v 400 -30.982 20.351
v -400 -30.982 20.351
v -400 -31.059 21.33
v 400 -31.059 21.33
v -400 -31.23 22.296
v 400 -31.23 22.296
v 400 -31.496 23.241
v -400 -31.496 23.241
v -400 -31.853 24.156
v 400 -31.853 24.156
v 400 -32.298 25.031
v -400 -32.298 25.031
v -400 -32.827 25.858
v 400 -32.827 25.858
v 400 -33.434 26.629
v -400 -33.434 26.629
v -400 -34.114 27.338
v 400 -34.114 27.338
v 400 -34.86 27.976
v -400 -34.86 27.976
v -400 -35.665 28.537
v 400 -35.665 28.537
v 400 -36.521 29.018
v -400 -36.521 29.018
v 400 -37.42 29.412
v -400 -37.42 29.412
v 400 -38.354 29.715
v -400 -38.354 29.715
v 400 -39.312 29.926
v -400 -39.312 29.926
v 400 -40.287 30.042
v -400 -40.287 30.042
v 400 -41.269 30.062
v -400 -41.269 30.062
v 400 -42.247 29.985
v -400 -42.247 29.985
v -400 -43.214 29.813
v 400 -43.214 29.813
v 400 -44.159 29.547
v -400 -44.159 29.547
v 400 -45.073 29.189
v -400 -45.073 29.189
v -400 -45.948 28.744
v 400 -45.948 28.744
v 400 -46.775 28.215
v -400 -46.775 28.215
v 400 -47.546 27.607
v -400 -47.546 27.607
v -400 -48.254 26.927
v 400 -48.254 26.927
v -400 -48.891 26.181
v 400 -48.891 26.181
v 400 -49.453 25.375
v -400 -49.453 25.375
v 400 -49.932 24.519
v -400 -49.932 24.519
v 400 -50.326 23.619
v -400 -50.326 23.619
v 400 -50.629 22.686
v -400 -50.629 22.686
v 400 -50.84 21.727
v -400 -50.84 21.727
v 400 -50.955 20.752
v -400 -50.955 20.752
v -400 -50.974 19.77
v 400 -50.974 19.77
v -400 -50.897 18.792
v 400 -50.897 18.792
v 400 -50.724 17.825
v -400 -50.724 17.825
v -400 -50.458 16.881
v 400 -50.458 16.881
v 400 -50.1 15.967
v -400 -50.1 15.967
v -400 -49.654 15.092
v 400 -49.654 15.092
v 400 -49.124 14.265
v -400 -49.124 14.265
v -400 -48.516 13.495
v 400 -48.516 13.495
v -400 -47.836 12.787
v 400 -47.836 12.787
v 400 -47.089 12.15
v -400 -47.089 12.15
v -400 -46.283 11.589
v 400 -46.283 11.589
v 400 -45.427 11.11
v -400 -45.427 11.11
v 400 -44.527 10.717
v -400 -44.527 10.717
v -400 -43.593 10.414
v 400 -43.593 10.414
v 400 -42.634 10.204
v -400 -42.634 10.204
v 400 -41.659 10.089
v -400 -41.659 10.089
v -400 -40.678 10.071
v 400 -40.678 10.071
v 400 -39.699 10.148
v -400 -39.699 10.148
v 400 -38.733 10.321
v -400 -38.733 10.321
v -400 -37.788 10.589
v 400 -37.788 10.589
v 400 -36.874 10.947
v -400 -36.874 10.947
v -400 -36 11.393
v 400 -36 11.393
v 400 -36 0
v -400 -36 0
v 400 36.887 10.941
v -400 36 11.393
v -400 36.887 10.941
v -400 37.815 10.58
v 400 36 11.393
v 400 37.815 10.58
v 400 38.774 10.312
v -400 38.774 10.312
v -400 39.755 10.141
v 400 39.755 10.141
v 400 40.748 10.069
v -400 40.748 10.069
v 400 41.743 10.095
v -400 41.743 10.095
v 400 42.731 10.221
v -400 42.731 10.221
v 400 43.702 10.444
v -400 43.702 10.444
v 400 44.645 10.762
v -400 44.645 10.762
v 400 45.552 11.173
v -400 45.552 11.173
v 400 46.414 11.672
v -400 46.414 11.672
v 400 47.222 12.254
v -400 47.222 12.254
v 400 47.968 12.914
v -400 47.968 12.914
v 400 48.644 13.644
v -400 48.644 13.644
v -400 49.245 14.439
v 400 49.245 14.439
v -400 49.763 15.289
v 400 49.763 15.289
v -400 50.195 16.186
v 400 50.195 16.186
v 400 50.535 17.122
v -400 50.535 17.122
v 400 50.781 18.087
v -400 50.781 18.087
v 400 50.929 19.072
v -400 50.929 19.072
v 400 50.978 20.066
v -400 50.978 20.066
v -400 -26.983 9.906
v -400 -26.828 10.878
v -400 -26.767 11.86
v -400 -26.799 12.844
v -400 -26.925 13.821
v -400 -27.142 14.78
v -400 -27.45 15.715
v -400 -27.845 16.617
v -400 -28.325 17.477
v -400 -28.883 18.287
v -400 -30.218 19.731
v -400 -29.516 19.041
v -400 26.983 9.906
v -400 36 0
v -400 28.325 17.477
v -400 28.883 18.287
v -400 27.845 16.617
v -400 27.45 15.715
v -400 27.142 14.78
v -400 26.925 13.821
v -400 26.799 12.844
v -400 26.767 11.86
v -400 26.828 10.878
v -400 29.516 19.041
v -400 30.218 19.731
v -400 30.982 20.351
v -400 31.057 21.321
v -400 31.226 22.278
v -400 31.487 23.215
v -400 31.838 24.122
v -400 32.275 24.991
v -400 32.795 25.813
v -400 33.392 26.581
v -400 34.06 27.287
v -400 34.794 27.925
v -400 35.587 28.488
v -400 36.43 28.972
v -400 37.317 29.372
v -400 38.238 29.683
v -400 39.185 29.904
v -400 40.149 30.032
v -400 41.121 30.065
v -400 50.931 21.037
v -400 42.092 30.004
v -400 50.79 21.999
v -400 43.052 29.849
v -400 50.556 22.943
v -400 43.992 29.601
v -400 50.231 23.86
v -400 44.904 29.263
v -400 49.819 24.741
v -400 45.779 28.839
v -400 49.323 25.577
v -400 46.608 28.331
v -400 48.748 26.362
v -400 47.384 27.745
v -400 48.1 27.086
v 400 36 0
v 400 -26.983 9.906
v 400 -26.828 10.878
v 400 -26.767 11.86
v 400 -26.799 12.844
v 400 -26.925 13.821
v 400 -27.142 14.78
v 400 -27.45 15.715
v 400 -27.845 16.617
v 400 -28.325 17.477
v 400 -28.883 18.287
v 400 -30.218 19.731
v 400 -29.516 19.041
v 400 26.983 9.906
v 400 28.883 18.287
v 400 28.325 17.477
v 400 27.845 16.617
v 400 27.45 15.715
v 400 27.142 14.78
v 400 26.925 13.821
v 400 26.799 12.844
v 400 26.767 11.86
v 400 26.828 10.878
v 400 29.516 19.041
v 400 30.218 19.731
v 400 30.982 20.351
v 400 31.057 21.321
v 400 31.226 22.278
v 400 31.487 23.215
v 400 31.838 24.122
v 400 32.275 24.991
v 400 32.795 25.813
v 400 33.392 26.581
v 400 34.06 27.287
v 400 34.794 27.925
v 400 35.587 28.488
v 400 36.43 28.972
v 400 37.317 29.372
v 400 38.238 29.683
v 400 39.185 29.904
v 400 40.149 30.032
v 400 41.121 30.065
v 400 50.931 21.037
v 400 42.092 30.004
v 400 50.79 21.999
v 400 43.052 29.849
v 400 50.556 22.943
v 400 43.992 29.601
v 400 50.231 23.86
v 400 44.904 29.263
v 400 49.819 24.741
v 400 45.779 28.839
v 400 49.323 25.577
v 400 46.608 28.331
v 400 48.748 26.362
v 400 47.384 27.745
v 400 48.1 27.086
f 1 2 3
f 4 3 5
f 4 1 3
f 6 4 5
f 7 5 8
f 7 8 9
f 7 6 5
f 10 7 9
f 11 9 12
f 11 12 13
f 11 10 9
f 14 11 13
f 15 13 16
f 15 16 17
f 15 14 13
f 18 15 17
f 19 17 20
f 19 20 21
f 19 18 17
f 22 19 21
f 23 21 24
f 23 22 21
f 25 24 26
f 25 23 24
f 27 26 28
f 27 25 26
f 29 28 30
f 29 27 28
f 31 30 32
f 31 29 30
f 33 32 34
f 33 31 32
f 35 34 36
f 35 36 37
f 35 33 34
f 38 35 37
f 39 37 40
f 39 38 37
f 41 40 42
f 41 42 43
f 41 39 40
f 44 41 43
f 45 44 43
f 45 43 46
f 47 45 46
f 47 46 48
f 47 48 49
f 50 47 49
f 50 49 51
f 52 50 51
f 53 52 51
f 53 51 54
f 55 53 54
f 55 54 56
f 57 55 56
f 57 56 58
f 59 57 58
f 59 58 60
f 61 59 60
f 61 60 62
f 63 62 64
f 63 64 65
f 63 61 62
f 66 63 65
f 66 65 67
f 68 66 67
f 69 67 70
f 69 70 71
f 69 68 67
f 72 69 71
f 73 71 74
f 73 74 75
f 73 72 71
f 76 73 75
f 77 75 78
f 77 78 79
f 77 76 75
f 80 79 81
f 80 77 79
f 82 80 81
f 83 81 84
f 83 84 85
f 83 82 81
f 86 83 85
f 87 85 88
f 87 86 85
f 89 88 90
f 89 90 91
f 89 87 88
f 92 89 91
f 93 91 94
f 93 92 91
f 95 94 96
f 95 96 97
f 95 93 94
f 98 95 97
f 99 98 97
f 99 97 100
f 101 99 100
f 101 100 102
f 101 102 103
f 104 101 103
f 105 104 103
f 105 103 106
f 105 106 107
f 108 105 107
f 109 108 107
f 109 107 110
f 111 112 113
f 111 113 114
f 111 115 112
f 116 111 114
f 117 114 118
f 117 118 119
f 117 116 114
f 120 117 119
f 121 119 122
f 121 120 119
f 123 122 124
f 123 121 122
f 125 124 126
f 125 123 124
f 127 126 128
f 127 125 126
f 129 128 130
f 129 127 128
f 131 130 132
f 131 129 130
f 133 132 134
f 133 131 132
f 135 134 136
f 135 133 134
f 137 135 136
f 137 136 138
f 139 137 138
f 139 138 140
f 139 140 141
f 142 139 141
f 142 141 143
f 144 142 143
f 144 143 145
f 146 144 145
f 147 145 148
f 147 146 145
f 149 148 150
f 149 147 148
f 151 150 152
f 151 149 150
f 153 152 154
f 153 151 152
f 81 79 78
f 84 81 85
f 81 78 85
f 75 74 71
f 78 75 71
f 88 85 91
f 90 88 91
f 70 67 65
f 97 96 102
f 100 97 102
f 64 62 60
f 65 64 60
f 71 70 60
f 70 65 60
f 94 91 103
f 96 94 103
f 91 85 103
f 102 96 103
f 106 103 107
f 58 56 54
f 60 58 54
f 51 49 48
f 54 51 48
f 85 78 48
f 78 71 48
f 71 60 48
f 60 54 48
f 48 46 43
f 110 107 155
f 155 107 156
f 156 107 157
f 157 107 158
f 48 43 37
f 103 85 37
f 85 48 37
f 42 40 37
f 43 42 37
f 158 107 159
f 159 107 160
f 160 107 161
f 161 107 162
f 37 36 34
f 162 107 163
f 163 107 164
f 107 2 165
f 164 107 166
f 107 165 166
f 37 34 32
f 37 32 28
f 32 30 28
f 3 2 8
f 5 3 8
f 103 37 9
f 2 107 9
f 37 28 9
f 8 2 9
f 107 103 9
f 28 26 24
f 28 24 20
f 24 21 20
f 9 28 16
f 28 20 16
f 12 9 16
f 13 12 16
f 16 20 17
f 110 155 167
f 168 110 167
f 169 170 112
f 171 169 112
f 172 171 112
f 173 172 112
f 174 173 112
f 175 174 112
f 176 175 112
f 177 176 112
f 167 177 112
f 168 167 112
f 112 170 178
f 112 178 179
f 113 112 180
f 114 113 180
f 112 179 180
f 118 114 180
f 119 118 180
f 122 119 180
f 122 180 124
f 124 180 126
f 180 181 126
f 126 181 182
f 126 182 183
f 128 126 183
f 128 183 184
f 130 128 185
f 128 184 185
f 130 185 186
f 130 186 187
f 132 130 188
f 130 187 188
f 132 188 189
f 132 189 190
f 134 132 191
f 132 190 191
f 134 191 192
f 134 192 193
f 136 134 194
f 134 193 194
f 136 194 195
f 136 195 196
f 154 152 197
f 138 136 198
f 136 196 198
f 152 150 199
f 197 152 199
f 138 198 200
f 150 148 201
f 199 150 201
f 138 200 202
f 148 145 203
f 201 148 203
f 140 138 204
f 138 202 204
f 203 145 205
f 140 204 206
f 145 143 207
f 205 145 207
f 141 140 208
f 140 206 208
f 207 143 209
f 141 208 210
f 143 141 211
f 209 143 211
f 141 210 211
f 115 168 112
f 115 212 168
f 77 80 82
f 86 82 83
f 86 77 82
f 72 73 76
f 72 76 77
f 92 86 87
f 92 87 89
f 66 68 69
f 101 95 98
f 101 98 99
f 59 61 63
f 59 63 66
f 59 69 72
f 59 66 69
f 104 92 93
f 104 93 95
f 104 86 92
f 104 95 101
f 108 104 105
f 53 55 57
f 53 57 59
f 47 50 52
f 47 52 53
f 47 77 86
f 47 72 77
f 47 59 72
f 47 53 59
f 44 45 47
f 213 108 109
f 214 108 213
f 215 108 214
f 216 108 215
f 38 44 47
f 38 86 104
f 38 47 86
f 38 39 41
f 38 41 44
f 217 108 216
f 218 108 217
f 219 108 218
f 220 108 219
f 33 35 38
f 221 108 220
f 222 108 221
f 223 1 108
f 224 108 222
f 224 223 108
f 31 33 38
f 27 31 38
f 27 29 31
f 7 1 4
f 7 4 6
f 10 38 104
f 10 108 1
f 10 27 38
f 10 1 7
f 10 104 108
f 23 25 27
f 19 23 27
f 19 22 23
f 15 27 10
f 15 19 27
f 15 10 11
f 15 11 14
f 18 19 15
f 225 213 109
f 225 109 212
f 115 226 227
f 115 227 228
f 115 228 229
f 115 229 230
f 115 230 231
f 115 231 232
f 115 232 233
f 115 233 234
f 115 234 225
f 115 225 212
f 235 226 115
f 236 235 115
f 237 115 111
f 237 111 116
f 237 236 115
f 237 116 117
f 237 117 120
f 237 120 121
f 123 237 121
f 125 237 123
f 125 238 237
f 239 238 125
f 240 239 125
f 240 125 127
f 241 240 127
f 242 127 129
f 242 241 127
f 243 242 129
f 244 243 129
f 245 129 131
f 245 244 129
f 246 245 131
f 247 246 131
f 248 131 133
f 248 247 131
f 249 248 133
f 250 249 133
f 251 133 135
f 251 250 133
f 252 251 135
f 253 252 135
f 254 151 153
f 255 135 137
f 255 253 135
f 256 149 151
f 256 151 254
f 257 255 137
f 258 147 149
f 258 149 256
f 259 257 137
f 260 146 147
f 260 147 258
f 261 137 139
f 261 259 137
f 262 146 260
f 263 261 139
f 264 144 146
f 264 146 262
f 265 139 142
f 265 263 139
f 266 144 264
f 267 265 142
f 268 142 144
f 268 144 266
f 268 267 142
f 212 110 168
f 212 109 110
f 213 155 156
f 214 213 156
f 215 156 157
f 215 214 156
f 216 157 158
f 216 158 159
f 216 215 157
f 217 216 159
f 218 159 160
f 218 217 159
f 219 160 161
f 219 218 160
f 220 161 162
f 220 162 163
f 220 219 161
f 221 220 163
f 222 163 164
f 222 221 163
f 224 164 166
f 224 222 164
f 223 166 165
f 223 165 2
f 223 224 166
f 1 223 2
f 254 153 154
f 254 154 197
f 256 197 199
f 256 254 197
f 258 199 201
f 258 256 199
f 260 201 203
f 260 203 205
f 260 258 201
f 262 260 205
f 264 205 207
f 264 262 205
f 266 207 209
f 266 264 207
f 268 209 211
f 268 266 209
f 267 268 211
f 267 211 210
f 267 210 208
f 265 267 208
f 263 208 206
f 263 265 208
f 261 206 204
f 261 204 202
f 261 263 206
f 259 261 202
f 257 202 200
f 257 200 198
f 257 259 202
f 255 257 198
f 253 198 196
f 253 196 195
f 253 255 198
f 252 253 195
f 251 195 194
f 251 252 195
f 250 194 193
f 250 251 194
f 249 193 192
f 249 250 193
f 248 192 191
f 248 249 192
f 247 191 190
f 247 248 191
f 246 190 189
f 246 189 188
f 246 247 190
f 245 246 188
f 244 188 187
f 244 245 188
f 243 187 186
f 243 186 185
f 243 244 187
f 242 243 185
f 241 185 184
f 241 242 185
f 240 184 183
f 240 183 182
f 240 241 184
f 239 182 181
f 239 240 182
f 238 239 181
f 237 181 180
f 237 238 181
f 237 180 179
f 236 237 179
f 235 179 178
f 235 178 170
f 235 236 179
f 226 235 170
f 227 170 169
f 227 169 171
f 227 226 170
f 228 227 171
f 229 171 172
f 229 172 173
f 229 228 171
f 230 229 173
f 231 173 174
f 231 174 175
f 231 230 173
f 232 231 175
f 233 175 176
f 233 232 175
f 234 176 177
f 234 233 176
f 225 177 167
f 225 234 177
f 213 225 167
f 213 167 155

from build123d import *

# Parameters (mm, degrees)
F1_DEPTH = 400


with BuildPart() as f1:
    # F0 (on Right) → F1 (new body, symmetric)
    with BuildSketch(Plane.YZ):
        with BuildLine():
            ThreePointArc((36, 11.393311), (45.989188, 11.411984), (50.9784, 20.066))
            ThreePointArc((50.9784, 20.066), (41.121, 30.064983), (30.982467, 20.35117))
            ThreePointArc((30.982467, 20.35117), (32.25381, 15.179127), (36, 11.393311))
        make_face()
        with BuildLine():
            ThreePointArc((36, 11.393311), (32.25381, 15.179127), (30.982467, 20.35117))
            ThreePointArc((30.982467, 20.35117), (27.450179, 15.715402), (26.983, 9.906))
            Line((26.983, 9.906), (0, 9.906))
            Line((0, 9.906), (0, 0))
            Line((0, 0), (36, 0))
            Line((36, 0), (36, 11.393311))
        make_face()
        with BuildLine():
            Line((0, 0), (0, 9.906))
            Line((0, 9.906), (-26.983, 9.906))
            ThreePointArc((-26.983, 9.906), (-27.450179, 15.715402), (-30.982467, 20.35117))
            ThreePointArc((-30.982467, 20.35117), (-30.979417, 20.2086), (-30.9784, 20.066))
            ThreePointArc((-30.9784, 20.066), (-32.324384, 15.055212), (-36, 11.393311))
            Line((-36, 11.393311), (-36, 0))
            Line((-36, 0), (0, 0))
        make_face()
        with BuildLine():
            ThreePointArc((-30.9784, 20.066), (-30.979417, 20.2086), (-30.982467, 20.35117))
            ThreePointArc((-30.982467, 20.35117), (-49.70299, 24.952873), (-36, 11.393311))
            ThreePointArc((-36, 11.393311), (-32.324384, 15.055212), (-30.9784, 20.066))
        make_face()
    extrude(amount=F1_DEPTH, both=True)


solid = f1.part
